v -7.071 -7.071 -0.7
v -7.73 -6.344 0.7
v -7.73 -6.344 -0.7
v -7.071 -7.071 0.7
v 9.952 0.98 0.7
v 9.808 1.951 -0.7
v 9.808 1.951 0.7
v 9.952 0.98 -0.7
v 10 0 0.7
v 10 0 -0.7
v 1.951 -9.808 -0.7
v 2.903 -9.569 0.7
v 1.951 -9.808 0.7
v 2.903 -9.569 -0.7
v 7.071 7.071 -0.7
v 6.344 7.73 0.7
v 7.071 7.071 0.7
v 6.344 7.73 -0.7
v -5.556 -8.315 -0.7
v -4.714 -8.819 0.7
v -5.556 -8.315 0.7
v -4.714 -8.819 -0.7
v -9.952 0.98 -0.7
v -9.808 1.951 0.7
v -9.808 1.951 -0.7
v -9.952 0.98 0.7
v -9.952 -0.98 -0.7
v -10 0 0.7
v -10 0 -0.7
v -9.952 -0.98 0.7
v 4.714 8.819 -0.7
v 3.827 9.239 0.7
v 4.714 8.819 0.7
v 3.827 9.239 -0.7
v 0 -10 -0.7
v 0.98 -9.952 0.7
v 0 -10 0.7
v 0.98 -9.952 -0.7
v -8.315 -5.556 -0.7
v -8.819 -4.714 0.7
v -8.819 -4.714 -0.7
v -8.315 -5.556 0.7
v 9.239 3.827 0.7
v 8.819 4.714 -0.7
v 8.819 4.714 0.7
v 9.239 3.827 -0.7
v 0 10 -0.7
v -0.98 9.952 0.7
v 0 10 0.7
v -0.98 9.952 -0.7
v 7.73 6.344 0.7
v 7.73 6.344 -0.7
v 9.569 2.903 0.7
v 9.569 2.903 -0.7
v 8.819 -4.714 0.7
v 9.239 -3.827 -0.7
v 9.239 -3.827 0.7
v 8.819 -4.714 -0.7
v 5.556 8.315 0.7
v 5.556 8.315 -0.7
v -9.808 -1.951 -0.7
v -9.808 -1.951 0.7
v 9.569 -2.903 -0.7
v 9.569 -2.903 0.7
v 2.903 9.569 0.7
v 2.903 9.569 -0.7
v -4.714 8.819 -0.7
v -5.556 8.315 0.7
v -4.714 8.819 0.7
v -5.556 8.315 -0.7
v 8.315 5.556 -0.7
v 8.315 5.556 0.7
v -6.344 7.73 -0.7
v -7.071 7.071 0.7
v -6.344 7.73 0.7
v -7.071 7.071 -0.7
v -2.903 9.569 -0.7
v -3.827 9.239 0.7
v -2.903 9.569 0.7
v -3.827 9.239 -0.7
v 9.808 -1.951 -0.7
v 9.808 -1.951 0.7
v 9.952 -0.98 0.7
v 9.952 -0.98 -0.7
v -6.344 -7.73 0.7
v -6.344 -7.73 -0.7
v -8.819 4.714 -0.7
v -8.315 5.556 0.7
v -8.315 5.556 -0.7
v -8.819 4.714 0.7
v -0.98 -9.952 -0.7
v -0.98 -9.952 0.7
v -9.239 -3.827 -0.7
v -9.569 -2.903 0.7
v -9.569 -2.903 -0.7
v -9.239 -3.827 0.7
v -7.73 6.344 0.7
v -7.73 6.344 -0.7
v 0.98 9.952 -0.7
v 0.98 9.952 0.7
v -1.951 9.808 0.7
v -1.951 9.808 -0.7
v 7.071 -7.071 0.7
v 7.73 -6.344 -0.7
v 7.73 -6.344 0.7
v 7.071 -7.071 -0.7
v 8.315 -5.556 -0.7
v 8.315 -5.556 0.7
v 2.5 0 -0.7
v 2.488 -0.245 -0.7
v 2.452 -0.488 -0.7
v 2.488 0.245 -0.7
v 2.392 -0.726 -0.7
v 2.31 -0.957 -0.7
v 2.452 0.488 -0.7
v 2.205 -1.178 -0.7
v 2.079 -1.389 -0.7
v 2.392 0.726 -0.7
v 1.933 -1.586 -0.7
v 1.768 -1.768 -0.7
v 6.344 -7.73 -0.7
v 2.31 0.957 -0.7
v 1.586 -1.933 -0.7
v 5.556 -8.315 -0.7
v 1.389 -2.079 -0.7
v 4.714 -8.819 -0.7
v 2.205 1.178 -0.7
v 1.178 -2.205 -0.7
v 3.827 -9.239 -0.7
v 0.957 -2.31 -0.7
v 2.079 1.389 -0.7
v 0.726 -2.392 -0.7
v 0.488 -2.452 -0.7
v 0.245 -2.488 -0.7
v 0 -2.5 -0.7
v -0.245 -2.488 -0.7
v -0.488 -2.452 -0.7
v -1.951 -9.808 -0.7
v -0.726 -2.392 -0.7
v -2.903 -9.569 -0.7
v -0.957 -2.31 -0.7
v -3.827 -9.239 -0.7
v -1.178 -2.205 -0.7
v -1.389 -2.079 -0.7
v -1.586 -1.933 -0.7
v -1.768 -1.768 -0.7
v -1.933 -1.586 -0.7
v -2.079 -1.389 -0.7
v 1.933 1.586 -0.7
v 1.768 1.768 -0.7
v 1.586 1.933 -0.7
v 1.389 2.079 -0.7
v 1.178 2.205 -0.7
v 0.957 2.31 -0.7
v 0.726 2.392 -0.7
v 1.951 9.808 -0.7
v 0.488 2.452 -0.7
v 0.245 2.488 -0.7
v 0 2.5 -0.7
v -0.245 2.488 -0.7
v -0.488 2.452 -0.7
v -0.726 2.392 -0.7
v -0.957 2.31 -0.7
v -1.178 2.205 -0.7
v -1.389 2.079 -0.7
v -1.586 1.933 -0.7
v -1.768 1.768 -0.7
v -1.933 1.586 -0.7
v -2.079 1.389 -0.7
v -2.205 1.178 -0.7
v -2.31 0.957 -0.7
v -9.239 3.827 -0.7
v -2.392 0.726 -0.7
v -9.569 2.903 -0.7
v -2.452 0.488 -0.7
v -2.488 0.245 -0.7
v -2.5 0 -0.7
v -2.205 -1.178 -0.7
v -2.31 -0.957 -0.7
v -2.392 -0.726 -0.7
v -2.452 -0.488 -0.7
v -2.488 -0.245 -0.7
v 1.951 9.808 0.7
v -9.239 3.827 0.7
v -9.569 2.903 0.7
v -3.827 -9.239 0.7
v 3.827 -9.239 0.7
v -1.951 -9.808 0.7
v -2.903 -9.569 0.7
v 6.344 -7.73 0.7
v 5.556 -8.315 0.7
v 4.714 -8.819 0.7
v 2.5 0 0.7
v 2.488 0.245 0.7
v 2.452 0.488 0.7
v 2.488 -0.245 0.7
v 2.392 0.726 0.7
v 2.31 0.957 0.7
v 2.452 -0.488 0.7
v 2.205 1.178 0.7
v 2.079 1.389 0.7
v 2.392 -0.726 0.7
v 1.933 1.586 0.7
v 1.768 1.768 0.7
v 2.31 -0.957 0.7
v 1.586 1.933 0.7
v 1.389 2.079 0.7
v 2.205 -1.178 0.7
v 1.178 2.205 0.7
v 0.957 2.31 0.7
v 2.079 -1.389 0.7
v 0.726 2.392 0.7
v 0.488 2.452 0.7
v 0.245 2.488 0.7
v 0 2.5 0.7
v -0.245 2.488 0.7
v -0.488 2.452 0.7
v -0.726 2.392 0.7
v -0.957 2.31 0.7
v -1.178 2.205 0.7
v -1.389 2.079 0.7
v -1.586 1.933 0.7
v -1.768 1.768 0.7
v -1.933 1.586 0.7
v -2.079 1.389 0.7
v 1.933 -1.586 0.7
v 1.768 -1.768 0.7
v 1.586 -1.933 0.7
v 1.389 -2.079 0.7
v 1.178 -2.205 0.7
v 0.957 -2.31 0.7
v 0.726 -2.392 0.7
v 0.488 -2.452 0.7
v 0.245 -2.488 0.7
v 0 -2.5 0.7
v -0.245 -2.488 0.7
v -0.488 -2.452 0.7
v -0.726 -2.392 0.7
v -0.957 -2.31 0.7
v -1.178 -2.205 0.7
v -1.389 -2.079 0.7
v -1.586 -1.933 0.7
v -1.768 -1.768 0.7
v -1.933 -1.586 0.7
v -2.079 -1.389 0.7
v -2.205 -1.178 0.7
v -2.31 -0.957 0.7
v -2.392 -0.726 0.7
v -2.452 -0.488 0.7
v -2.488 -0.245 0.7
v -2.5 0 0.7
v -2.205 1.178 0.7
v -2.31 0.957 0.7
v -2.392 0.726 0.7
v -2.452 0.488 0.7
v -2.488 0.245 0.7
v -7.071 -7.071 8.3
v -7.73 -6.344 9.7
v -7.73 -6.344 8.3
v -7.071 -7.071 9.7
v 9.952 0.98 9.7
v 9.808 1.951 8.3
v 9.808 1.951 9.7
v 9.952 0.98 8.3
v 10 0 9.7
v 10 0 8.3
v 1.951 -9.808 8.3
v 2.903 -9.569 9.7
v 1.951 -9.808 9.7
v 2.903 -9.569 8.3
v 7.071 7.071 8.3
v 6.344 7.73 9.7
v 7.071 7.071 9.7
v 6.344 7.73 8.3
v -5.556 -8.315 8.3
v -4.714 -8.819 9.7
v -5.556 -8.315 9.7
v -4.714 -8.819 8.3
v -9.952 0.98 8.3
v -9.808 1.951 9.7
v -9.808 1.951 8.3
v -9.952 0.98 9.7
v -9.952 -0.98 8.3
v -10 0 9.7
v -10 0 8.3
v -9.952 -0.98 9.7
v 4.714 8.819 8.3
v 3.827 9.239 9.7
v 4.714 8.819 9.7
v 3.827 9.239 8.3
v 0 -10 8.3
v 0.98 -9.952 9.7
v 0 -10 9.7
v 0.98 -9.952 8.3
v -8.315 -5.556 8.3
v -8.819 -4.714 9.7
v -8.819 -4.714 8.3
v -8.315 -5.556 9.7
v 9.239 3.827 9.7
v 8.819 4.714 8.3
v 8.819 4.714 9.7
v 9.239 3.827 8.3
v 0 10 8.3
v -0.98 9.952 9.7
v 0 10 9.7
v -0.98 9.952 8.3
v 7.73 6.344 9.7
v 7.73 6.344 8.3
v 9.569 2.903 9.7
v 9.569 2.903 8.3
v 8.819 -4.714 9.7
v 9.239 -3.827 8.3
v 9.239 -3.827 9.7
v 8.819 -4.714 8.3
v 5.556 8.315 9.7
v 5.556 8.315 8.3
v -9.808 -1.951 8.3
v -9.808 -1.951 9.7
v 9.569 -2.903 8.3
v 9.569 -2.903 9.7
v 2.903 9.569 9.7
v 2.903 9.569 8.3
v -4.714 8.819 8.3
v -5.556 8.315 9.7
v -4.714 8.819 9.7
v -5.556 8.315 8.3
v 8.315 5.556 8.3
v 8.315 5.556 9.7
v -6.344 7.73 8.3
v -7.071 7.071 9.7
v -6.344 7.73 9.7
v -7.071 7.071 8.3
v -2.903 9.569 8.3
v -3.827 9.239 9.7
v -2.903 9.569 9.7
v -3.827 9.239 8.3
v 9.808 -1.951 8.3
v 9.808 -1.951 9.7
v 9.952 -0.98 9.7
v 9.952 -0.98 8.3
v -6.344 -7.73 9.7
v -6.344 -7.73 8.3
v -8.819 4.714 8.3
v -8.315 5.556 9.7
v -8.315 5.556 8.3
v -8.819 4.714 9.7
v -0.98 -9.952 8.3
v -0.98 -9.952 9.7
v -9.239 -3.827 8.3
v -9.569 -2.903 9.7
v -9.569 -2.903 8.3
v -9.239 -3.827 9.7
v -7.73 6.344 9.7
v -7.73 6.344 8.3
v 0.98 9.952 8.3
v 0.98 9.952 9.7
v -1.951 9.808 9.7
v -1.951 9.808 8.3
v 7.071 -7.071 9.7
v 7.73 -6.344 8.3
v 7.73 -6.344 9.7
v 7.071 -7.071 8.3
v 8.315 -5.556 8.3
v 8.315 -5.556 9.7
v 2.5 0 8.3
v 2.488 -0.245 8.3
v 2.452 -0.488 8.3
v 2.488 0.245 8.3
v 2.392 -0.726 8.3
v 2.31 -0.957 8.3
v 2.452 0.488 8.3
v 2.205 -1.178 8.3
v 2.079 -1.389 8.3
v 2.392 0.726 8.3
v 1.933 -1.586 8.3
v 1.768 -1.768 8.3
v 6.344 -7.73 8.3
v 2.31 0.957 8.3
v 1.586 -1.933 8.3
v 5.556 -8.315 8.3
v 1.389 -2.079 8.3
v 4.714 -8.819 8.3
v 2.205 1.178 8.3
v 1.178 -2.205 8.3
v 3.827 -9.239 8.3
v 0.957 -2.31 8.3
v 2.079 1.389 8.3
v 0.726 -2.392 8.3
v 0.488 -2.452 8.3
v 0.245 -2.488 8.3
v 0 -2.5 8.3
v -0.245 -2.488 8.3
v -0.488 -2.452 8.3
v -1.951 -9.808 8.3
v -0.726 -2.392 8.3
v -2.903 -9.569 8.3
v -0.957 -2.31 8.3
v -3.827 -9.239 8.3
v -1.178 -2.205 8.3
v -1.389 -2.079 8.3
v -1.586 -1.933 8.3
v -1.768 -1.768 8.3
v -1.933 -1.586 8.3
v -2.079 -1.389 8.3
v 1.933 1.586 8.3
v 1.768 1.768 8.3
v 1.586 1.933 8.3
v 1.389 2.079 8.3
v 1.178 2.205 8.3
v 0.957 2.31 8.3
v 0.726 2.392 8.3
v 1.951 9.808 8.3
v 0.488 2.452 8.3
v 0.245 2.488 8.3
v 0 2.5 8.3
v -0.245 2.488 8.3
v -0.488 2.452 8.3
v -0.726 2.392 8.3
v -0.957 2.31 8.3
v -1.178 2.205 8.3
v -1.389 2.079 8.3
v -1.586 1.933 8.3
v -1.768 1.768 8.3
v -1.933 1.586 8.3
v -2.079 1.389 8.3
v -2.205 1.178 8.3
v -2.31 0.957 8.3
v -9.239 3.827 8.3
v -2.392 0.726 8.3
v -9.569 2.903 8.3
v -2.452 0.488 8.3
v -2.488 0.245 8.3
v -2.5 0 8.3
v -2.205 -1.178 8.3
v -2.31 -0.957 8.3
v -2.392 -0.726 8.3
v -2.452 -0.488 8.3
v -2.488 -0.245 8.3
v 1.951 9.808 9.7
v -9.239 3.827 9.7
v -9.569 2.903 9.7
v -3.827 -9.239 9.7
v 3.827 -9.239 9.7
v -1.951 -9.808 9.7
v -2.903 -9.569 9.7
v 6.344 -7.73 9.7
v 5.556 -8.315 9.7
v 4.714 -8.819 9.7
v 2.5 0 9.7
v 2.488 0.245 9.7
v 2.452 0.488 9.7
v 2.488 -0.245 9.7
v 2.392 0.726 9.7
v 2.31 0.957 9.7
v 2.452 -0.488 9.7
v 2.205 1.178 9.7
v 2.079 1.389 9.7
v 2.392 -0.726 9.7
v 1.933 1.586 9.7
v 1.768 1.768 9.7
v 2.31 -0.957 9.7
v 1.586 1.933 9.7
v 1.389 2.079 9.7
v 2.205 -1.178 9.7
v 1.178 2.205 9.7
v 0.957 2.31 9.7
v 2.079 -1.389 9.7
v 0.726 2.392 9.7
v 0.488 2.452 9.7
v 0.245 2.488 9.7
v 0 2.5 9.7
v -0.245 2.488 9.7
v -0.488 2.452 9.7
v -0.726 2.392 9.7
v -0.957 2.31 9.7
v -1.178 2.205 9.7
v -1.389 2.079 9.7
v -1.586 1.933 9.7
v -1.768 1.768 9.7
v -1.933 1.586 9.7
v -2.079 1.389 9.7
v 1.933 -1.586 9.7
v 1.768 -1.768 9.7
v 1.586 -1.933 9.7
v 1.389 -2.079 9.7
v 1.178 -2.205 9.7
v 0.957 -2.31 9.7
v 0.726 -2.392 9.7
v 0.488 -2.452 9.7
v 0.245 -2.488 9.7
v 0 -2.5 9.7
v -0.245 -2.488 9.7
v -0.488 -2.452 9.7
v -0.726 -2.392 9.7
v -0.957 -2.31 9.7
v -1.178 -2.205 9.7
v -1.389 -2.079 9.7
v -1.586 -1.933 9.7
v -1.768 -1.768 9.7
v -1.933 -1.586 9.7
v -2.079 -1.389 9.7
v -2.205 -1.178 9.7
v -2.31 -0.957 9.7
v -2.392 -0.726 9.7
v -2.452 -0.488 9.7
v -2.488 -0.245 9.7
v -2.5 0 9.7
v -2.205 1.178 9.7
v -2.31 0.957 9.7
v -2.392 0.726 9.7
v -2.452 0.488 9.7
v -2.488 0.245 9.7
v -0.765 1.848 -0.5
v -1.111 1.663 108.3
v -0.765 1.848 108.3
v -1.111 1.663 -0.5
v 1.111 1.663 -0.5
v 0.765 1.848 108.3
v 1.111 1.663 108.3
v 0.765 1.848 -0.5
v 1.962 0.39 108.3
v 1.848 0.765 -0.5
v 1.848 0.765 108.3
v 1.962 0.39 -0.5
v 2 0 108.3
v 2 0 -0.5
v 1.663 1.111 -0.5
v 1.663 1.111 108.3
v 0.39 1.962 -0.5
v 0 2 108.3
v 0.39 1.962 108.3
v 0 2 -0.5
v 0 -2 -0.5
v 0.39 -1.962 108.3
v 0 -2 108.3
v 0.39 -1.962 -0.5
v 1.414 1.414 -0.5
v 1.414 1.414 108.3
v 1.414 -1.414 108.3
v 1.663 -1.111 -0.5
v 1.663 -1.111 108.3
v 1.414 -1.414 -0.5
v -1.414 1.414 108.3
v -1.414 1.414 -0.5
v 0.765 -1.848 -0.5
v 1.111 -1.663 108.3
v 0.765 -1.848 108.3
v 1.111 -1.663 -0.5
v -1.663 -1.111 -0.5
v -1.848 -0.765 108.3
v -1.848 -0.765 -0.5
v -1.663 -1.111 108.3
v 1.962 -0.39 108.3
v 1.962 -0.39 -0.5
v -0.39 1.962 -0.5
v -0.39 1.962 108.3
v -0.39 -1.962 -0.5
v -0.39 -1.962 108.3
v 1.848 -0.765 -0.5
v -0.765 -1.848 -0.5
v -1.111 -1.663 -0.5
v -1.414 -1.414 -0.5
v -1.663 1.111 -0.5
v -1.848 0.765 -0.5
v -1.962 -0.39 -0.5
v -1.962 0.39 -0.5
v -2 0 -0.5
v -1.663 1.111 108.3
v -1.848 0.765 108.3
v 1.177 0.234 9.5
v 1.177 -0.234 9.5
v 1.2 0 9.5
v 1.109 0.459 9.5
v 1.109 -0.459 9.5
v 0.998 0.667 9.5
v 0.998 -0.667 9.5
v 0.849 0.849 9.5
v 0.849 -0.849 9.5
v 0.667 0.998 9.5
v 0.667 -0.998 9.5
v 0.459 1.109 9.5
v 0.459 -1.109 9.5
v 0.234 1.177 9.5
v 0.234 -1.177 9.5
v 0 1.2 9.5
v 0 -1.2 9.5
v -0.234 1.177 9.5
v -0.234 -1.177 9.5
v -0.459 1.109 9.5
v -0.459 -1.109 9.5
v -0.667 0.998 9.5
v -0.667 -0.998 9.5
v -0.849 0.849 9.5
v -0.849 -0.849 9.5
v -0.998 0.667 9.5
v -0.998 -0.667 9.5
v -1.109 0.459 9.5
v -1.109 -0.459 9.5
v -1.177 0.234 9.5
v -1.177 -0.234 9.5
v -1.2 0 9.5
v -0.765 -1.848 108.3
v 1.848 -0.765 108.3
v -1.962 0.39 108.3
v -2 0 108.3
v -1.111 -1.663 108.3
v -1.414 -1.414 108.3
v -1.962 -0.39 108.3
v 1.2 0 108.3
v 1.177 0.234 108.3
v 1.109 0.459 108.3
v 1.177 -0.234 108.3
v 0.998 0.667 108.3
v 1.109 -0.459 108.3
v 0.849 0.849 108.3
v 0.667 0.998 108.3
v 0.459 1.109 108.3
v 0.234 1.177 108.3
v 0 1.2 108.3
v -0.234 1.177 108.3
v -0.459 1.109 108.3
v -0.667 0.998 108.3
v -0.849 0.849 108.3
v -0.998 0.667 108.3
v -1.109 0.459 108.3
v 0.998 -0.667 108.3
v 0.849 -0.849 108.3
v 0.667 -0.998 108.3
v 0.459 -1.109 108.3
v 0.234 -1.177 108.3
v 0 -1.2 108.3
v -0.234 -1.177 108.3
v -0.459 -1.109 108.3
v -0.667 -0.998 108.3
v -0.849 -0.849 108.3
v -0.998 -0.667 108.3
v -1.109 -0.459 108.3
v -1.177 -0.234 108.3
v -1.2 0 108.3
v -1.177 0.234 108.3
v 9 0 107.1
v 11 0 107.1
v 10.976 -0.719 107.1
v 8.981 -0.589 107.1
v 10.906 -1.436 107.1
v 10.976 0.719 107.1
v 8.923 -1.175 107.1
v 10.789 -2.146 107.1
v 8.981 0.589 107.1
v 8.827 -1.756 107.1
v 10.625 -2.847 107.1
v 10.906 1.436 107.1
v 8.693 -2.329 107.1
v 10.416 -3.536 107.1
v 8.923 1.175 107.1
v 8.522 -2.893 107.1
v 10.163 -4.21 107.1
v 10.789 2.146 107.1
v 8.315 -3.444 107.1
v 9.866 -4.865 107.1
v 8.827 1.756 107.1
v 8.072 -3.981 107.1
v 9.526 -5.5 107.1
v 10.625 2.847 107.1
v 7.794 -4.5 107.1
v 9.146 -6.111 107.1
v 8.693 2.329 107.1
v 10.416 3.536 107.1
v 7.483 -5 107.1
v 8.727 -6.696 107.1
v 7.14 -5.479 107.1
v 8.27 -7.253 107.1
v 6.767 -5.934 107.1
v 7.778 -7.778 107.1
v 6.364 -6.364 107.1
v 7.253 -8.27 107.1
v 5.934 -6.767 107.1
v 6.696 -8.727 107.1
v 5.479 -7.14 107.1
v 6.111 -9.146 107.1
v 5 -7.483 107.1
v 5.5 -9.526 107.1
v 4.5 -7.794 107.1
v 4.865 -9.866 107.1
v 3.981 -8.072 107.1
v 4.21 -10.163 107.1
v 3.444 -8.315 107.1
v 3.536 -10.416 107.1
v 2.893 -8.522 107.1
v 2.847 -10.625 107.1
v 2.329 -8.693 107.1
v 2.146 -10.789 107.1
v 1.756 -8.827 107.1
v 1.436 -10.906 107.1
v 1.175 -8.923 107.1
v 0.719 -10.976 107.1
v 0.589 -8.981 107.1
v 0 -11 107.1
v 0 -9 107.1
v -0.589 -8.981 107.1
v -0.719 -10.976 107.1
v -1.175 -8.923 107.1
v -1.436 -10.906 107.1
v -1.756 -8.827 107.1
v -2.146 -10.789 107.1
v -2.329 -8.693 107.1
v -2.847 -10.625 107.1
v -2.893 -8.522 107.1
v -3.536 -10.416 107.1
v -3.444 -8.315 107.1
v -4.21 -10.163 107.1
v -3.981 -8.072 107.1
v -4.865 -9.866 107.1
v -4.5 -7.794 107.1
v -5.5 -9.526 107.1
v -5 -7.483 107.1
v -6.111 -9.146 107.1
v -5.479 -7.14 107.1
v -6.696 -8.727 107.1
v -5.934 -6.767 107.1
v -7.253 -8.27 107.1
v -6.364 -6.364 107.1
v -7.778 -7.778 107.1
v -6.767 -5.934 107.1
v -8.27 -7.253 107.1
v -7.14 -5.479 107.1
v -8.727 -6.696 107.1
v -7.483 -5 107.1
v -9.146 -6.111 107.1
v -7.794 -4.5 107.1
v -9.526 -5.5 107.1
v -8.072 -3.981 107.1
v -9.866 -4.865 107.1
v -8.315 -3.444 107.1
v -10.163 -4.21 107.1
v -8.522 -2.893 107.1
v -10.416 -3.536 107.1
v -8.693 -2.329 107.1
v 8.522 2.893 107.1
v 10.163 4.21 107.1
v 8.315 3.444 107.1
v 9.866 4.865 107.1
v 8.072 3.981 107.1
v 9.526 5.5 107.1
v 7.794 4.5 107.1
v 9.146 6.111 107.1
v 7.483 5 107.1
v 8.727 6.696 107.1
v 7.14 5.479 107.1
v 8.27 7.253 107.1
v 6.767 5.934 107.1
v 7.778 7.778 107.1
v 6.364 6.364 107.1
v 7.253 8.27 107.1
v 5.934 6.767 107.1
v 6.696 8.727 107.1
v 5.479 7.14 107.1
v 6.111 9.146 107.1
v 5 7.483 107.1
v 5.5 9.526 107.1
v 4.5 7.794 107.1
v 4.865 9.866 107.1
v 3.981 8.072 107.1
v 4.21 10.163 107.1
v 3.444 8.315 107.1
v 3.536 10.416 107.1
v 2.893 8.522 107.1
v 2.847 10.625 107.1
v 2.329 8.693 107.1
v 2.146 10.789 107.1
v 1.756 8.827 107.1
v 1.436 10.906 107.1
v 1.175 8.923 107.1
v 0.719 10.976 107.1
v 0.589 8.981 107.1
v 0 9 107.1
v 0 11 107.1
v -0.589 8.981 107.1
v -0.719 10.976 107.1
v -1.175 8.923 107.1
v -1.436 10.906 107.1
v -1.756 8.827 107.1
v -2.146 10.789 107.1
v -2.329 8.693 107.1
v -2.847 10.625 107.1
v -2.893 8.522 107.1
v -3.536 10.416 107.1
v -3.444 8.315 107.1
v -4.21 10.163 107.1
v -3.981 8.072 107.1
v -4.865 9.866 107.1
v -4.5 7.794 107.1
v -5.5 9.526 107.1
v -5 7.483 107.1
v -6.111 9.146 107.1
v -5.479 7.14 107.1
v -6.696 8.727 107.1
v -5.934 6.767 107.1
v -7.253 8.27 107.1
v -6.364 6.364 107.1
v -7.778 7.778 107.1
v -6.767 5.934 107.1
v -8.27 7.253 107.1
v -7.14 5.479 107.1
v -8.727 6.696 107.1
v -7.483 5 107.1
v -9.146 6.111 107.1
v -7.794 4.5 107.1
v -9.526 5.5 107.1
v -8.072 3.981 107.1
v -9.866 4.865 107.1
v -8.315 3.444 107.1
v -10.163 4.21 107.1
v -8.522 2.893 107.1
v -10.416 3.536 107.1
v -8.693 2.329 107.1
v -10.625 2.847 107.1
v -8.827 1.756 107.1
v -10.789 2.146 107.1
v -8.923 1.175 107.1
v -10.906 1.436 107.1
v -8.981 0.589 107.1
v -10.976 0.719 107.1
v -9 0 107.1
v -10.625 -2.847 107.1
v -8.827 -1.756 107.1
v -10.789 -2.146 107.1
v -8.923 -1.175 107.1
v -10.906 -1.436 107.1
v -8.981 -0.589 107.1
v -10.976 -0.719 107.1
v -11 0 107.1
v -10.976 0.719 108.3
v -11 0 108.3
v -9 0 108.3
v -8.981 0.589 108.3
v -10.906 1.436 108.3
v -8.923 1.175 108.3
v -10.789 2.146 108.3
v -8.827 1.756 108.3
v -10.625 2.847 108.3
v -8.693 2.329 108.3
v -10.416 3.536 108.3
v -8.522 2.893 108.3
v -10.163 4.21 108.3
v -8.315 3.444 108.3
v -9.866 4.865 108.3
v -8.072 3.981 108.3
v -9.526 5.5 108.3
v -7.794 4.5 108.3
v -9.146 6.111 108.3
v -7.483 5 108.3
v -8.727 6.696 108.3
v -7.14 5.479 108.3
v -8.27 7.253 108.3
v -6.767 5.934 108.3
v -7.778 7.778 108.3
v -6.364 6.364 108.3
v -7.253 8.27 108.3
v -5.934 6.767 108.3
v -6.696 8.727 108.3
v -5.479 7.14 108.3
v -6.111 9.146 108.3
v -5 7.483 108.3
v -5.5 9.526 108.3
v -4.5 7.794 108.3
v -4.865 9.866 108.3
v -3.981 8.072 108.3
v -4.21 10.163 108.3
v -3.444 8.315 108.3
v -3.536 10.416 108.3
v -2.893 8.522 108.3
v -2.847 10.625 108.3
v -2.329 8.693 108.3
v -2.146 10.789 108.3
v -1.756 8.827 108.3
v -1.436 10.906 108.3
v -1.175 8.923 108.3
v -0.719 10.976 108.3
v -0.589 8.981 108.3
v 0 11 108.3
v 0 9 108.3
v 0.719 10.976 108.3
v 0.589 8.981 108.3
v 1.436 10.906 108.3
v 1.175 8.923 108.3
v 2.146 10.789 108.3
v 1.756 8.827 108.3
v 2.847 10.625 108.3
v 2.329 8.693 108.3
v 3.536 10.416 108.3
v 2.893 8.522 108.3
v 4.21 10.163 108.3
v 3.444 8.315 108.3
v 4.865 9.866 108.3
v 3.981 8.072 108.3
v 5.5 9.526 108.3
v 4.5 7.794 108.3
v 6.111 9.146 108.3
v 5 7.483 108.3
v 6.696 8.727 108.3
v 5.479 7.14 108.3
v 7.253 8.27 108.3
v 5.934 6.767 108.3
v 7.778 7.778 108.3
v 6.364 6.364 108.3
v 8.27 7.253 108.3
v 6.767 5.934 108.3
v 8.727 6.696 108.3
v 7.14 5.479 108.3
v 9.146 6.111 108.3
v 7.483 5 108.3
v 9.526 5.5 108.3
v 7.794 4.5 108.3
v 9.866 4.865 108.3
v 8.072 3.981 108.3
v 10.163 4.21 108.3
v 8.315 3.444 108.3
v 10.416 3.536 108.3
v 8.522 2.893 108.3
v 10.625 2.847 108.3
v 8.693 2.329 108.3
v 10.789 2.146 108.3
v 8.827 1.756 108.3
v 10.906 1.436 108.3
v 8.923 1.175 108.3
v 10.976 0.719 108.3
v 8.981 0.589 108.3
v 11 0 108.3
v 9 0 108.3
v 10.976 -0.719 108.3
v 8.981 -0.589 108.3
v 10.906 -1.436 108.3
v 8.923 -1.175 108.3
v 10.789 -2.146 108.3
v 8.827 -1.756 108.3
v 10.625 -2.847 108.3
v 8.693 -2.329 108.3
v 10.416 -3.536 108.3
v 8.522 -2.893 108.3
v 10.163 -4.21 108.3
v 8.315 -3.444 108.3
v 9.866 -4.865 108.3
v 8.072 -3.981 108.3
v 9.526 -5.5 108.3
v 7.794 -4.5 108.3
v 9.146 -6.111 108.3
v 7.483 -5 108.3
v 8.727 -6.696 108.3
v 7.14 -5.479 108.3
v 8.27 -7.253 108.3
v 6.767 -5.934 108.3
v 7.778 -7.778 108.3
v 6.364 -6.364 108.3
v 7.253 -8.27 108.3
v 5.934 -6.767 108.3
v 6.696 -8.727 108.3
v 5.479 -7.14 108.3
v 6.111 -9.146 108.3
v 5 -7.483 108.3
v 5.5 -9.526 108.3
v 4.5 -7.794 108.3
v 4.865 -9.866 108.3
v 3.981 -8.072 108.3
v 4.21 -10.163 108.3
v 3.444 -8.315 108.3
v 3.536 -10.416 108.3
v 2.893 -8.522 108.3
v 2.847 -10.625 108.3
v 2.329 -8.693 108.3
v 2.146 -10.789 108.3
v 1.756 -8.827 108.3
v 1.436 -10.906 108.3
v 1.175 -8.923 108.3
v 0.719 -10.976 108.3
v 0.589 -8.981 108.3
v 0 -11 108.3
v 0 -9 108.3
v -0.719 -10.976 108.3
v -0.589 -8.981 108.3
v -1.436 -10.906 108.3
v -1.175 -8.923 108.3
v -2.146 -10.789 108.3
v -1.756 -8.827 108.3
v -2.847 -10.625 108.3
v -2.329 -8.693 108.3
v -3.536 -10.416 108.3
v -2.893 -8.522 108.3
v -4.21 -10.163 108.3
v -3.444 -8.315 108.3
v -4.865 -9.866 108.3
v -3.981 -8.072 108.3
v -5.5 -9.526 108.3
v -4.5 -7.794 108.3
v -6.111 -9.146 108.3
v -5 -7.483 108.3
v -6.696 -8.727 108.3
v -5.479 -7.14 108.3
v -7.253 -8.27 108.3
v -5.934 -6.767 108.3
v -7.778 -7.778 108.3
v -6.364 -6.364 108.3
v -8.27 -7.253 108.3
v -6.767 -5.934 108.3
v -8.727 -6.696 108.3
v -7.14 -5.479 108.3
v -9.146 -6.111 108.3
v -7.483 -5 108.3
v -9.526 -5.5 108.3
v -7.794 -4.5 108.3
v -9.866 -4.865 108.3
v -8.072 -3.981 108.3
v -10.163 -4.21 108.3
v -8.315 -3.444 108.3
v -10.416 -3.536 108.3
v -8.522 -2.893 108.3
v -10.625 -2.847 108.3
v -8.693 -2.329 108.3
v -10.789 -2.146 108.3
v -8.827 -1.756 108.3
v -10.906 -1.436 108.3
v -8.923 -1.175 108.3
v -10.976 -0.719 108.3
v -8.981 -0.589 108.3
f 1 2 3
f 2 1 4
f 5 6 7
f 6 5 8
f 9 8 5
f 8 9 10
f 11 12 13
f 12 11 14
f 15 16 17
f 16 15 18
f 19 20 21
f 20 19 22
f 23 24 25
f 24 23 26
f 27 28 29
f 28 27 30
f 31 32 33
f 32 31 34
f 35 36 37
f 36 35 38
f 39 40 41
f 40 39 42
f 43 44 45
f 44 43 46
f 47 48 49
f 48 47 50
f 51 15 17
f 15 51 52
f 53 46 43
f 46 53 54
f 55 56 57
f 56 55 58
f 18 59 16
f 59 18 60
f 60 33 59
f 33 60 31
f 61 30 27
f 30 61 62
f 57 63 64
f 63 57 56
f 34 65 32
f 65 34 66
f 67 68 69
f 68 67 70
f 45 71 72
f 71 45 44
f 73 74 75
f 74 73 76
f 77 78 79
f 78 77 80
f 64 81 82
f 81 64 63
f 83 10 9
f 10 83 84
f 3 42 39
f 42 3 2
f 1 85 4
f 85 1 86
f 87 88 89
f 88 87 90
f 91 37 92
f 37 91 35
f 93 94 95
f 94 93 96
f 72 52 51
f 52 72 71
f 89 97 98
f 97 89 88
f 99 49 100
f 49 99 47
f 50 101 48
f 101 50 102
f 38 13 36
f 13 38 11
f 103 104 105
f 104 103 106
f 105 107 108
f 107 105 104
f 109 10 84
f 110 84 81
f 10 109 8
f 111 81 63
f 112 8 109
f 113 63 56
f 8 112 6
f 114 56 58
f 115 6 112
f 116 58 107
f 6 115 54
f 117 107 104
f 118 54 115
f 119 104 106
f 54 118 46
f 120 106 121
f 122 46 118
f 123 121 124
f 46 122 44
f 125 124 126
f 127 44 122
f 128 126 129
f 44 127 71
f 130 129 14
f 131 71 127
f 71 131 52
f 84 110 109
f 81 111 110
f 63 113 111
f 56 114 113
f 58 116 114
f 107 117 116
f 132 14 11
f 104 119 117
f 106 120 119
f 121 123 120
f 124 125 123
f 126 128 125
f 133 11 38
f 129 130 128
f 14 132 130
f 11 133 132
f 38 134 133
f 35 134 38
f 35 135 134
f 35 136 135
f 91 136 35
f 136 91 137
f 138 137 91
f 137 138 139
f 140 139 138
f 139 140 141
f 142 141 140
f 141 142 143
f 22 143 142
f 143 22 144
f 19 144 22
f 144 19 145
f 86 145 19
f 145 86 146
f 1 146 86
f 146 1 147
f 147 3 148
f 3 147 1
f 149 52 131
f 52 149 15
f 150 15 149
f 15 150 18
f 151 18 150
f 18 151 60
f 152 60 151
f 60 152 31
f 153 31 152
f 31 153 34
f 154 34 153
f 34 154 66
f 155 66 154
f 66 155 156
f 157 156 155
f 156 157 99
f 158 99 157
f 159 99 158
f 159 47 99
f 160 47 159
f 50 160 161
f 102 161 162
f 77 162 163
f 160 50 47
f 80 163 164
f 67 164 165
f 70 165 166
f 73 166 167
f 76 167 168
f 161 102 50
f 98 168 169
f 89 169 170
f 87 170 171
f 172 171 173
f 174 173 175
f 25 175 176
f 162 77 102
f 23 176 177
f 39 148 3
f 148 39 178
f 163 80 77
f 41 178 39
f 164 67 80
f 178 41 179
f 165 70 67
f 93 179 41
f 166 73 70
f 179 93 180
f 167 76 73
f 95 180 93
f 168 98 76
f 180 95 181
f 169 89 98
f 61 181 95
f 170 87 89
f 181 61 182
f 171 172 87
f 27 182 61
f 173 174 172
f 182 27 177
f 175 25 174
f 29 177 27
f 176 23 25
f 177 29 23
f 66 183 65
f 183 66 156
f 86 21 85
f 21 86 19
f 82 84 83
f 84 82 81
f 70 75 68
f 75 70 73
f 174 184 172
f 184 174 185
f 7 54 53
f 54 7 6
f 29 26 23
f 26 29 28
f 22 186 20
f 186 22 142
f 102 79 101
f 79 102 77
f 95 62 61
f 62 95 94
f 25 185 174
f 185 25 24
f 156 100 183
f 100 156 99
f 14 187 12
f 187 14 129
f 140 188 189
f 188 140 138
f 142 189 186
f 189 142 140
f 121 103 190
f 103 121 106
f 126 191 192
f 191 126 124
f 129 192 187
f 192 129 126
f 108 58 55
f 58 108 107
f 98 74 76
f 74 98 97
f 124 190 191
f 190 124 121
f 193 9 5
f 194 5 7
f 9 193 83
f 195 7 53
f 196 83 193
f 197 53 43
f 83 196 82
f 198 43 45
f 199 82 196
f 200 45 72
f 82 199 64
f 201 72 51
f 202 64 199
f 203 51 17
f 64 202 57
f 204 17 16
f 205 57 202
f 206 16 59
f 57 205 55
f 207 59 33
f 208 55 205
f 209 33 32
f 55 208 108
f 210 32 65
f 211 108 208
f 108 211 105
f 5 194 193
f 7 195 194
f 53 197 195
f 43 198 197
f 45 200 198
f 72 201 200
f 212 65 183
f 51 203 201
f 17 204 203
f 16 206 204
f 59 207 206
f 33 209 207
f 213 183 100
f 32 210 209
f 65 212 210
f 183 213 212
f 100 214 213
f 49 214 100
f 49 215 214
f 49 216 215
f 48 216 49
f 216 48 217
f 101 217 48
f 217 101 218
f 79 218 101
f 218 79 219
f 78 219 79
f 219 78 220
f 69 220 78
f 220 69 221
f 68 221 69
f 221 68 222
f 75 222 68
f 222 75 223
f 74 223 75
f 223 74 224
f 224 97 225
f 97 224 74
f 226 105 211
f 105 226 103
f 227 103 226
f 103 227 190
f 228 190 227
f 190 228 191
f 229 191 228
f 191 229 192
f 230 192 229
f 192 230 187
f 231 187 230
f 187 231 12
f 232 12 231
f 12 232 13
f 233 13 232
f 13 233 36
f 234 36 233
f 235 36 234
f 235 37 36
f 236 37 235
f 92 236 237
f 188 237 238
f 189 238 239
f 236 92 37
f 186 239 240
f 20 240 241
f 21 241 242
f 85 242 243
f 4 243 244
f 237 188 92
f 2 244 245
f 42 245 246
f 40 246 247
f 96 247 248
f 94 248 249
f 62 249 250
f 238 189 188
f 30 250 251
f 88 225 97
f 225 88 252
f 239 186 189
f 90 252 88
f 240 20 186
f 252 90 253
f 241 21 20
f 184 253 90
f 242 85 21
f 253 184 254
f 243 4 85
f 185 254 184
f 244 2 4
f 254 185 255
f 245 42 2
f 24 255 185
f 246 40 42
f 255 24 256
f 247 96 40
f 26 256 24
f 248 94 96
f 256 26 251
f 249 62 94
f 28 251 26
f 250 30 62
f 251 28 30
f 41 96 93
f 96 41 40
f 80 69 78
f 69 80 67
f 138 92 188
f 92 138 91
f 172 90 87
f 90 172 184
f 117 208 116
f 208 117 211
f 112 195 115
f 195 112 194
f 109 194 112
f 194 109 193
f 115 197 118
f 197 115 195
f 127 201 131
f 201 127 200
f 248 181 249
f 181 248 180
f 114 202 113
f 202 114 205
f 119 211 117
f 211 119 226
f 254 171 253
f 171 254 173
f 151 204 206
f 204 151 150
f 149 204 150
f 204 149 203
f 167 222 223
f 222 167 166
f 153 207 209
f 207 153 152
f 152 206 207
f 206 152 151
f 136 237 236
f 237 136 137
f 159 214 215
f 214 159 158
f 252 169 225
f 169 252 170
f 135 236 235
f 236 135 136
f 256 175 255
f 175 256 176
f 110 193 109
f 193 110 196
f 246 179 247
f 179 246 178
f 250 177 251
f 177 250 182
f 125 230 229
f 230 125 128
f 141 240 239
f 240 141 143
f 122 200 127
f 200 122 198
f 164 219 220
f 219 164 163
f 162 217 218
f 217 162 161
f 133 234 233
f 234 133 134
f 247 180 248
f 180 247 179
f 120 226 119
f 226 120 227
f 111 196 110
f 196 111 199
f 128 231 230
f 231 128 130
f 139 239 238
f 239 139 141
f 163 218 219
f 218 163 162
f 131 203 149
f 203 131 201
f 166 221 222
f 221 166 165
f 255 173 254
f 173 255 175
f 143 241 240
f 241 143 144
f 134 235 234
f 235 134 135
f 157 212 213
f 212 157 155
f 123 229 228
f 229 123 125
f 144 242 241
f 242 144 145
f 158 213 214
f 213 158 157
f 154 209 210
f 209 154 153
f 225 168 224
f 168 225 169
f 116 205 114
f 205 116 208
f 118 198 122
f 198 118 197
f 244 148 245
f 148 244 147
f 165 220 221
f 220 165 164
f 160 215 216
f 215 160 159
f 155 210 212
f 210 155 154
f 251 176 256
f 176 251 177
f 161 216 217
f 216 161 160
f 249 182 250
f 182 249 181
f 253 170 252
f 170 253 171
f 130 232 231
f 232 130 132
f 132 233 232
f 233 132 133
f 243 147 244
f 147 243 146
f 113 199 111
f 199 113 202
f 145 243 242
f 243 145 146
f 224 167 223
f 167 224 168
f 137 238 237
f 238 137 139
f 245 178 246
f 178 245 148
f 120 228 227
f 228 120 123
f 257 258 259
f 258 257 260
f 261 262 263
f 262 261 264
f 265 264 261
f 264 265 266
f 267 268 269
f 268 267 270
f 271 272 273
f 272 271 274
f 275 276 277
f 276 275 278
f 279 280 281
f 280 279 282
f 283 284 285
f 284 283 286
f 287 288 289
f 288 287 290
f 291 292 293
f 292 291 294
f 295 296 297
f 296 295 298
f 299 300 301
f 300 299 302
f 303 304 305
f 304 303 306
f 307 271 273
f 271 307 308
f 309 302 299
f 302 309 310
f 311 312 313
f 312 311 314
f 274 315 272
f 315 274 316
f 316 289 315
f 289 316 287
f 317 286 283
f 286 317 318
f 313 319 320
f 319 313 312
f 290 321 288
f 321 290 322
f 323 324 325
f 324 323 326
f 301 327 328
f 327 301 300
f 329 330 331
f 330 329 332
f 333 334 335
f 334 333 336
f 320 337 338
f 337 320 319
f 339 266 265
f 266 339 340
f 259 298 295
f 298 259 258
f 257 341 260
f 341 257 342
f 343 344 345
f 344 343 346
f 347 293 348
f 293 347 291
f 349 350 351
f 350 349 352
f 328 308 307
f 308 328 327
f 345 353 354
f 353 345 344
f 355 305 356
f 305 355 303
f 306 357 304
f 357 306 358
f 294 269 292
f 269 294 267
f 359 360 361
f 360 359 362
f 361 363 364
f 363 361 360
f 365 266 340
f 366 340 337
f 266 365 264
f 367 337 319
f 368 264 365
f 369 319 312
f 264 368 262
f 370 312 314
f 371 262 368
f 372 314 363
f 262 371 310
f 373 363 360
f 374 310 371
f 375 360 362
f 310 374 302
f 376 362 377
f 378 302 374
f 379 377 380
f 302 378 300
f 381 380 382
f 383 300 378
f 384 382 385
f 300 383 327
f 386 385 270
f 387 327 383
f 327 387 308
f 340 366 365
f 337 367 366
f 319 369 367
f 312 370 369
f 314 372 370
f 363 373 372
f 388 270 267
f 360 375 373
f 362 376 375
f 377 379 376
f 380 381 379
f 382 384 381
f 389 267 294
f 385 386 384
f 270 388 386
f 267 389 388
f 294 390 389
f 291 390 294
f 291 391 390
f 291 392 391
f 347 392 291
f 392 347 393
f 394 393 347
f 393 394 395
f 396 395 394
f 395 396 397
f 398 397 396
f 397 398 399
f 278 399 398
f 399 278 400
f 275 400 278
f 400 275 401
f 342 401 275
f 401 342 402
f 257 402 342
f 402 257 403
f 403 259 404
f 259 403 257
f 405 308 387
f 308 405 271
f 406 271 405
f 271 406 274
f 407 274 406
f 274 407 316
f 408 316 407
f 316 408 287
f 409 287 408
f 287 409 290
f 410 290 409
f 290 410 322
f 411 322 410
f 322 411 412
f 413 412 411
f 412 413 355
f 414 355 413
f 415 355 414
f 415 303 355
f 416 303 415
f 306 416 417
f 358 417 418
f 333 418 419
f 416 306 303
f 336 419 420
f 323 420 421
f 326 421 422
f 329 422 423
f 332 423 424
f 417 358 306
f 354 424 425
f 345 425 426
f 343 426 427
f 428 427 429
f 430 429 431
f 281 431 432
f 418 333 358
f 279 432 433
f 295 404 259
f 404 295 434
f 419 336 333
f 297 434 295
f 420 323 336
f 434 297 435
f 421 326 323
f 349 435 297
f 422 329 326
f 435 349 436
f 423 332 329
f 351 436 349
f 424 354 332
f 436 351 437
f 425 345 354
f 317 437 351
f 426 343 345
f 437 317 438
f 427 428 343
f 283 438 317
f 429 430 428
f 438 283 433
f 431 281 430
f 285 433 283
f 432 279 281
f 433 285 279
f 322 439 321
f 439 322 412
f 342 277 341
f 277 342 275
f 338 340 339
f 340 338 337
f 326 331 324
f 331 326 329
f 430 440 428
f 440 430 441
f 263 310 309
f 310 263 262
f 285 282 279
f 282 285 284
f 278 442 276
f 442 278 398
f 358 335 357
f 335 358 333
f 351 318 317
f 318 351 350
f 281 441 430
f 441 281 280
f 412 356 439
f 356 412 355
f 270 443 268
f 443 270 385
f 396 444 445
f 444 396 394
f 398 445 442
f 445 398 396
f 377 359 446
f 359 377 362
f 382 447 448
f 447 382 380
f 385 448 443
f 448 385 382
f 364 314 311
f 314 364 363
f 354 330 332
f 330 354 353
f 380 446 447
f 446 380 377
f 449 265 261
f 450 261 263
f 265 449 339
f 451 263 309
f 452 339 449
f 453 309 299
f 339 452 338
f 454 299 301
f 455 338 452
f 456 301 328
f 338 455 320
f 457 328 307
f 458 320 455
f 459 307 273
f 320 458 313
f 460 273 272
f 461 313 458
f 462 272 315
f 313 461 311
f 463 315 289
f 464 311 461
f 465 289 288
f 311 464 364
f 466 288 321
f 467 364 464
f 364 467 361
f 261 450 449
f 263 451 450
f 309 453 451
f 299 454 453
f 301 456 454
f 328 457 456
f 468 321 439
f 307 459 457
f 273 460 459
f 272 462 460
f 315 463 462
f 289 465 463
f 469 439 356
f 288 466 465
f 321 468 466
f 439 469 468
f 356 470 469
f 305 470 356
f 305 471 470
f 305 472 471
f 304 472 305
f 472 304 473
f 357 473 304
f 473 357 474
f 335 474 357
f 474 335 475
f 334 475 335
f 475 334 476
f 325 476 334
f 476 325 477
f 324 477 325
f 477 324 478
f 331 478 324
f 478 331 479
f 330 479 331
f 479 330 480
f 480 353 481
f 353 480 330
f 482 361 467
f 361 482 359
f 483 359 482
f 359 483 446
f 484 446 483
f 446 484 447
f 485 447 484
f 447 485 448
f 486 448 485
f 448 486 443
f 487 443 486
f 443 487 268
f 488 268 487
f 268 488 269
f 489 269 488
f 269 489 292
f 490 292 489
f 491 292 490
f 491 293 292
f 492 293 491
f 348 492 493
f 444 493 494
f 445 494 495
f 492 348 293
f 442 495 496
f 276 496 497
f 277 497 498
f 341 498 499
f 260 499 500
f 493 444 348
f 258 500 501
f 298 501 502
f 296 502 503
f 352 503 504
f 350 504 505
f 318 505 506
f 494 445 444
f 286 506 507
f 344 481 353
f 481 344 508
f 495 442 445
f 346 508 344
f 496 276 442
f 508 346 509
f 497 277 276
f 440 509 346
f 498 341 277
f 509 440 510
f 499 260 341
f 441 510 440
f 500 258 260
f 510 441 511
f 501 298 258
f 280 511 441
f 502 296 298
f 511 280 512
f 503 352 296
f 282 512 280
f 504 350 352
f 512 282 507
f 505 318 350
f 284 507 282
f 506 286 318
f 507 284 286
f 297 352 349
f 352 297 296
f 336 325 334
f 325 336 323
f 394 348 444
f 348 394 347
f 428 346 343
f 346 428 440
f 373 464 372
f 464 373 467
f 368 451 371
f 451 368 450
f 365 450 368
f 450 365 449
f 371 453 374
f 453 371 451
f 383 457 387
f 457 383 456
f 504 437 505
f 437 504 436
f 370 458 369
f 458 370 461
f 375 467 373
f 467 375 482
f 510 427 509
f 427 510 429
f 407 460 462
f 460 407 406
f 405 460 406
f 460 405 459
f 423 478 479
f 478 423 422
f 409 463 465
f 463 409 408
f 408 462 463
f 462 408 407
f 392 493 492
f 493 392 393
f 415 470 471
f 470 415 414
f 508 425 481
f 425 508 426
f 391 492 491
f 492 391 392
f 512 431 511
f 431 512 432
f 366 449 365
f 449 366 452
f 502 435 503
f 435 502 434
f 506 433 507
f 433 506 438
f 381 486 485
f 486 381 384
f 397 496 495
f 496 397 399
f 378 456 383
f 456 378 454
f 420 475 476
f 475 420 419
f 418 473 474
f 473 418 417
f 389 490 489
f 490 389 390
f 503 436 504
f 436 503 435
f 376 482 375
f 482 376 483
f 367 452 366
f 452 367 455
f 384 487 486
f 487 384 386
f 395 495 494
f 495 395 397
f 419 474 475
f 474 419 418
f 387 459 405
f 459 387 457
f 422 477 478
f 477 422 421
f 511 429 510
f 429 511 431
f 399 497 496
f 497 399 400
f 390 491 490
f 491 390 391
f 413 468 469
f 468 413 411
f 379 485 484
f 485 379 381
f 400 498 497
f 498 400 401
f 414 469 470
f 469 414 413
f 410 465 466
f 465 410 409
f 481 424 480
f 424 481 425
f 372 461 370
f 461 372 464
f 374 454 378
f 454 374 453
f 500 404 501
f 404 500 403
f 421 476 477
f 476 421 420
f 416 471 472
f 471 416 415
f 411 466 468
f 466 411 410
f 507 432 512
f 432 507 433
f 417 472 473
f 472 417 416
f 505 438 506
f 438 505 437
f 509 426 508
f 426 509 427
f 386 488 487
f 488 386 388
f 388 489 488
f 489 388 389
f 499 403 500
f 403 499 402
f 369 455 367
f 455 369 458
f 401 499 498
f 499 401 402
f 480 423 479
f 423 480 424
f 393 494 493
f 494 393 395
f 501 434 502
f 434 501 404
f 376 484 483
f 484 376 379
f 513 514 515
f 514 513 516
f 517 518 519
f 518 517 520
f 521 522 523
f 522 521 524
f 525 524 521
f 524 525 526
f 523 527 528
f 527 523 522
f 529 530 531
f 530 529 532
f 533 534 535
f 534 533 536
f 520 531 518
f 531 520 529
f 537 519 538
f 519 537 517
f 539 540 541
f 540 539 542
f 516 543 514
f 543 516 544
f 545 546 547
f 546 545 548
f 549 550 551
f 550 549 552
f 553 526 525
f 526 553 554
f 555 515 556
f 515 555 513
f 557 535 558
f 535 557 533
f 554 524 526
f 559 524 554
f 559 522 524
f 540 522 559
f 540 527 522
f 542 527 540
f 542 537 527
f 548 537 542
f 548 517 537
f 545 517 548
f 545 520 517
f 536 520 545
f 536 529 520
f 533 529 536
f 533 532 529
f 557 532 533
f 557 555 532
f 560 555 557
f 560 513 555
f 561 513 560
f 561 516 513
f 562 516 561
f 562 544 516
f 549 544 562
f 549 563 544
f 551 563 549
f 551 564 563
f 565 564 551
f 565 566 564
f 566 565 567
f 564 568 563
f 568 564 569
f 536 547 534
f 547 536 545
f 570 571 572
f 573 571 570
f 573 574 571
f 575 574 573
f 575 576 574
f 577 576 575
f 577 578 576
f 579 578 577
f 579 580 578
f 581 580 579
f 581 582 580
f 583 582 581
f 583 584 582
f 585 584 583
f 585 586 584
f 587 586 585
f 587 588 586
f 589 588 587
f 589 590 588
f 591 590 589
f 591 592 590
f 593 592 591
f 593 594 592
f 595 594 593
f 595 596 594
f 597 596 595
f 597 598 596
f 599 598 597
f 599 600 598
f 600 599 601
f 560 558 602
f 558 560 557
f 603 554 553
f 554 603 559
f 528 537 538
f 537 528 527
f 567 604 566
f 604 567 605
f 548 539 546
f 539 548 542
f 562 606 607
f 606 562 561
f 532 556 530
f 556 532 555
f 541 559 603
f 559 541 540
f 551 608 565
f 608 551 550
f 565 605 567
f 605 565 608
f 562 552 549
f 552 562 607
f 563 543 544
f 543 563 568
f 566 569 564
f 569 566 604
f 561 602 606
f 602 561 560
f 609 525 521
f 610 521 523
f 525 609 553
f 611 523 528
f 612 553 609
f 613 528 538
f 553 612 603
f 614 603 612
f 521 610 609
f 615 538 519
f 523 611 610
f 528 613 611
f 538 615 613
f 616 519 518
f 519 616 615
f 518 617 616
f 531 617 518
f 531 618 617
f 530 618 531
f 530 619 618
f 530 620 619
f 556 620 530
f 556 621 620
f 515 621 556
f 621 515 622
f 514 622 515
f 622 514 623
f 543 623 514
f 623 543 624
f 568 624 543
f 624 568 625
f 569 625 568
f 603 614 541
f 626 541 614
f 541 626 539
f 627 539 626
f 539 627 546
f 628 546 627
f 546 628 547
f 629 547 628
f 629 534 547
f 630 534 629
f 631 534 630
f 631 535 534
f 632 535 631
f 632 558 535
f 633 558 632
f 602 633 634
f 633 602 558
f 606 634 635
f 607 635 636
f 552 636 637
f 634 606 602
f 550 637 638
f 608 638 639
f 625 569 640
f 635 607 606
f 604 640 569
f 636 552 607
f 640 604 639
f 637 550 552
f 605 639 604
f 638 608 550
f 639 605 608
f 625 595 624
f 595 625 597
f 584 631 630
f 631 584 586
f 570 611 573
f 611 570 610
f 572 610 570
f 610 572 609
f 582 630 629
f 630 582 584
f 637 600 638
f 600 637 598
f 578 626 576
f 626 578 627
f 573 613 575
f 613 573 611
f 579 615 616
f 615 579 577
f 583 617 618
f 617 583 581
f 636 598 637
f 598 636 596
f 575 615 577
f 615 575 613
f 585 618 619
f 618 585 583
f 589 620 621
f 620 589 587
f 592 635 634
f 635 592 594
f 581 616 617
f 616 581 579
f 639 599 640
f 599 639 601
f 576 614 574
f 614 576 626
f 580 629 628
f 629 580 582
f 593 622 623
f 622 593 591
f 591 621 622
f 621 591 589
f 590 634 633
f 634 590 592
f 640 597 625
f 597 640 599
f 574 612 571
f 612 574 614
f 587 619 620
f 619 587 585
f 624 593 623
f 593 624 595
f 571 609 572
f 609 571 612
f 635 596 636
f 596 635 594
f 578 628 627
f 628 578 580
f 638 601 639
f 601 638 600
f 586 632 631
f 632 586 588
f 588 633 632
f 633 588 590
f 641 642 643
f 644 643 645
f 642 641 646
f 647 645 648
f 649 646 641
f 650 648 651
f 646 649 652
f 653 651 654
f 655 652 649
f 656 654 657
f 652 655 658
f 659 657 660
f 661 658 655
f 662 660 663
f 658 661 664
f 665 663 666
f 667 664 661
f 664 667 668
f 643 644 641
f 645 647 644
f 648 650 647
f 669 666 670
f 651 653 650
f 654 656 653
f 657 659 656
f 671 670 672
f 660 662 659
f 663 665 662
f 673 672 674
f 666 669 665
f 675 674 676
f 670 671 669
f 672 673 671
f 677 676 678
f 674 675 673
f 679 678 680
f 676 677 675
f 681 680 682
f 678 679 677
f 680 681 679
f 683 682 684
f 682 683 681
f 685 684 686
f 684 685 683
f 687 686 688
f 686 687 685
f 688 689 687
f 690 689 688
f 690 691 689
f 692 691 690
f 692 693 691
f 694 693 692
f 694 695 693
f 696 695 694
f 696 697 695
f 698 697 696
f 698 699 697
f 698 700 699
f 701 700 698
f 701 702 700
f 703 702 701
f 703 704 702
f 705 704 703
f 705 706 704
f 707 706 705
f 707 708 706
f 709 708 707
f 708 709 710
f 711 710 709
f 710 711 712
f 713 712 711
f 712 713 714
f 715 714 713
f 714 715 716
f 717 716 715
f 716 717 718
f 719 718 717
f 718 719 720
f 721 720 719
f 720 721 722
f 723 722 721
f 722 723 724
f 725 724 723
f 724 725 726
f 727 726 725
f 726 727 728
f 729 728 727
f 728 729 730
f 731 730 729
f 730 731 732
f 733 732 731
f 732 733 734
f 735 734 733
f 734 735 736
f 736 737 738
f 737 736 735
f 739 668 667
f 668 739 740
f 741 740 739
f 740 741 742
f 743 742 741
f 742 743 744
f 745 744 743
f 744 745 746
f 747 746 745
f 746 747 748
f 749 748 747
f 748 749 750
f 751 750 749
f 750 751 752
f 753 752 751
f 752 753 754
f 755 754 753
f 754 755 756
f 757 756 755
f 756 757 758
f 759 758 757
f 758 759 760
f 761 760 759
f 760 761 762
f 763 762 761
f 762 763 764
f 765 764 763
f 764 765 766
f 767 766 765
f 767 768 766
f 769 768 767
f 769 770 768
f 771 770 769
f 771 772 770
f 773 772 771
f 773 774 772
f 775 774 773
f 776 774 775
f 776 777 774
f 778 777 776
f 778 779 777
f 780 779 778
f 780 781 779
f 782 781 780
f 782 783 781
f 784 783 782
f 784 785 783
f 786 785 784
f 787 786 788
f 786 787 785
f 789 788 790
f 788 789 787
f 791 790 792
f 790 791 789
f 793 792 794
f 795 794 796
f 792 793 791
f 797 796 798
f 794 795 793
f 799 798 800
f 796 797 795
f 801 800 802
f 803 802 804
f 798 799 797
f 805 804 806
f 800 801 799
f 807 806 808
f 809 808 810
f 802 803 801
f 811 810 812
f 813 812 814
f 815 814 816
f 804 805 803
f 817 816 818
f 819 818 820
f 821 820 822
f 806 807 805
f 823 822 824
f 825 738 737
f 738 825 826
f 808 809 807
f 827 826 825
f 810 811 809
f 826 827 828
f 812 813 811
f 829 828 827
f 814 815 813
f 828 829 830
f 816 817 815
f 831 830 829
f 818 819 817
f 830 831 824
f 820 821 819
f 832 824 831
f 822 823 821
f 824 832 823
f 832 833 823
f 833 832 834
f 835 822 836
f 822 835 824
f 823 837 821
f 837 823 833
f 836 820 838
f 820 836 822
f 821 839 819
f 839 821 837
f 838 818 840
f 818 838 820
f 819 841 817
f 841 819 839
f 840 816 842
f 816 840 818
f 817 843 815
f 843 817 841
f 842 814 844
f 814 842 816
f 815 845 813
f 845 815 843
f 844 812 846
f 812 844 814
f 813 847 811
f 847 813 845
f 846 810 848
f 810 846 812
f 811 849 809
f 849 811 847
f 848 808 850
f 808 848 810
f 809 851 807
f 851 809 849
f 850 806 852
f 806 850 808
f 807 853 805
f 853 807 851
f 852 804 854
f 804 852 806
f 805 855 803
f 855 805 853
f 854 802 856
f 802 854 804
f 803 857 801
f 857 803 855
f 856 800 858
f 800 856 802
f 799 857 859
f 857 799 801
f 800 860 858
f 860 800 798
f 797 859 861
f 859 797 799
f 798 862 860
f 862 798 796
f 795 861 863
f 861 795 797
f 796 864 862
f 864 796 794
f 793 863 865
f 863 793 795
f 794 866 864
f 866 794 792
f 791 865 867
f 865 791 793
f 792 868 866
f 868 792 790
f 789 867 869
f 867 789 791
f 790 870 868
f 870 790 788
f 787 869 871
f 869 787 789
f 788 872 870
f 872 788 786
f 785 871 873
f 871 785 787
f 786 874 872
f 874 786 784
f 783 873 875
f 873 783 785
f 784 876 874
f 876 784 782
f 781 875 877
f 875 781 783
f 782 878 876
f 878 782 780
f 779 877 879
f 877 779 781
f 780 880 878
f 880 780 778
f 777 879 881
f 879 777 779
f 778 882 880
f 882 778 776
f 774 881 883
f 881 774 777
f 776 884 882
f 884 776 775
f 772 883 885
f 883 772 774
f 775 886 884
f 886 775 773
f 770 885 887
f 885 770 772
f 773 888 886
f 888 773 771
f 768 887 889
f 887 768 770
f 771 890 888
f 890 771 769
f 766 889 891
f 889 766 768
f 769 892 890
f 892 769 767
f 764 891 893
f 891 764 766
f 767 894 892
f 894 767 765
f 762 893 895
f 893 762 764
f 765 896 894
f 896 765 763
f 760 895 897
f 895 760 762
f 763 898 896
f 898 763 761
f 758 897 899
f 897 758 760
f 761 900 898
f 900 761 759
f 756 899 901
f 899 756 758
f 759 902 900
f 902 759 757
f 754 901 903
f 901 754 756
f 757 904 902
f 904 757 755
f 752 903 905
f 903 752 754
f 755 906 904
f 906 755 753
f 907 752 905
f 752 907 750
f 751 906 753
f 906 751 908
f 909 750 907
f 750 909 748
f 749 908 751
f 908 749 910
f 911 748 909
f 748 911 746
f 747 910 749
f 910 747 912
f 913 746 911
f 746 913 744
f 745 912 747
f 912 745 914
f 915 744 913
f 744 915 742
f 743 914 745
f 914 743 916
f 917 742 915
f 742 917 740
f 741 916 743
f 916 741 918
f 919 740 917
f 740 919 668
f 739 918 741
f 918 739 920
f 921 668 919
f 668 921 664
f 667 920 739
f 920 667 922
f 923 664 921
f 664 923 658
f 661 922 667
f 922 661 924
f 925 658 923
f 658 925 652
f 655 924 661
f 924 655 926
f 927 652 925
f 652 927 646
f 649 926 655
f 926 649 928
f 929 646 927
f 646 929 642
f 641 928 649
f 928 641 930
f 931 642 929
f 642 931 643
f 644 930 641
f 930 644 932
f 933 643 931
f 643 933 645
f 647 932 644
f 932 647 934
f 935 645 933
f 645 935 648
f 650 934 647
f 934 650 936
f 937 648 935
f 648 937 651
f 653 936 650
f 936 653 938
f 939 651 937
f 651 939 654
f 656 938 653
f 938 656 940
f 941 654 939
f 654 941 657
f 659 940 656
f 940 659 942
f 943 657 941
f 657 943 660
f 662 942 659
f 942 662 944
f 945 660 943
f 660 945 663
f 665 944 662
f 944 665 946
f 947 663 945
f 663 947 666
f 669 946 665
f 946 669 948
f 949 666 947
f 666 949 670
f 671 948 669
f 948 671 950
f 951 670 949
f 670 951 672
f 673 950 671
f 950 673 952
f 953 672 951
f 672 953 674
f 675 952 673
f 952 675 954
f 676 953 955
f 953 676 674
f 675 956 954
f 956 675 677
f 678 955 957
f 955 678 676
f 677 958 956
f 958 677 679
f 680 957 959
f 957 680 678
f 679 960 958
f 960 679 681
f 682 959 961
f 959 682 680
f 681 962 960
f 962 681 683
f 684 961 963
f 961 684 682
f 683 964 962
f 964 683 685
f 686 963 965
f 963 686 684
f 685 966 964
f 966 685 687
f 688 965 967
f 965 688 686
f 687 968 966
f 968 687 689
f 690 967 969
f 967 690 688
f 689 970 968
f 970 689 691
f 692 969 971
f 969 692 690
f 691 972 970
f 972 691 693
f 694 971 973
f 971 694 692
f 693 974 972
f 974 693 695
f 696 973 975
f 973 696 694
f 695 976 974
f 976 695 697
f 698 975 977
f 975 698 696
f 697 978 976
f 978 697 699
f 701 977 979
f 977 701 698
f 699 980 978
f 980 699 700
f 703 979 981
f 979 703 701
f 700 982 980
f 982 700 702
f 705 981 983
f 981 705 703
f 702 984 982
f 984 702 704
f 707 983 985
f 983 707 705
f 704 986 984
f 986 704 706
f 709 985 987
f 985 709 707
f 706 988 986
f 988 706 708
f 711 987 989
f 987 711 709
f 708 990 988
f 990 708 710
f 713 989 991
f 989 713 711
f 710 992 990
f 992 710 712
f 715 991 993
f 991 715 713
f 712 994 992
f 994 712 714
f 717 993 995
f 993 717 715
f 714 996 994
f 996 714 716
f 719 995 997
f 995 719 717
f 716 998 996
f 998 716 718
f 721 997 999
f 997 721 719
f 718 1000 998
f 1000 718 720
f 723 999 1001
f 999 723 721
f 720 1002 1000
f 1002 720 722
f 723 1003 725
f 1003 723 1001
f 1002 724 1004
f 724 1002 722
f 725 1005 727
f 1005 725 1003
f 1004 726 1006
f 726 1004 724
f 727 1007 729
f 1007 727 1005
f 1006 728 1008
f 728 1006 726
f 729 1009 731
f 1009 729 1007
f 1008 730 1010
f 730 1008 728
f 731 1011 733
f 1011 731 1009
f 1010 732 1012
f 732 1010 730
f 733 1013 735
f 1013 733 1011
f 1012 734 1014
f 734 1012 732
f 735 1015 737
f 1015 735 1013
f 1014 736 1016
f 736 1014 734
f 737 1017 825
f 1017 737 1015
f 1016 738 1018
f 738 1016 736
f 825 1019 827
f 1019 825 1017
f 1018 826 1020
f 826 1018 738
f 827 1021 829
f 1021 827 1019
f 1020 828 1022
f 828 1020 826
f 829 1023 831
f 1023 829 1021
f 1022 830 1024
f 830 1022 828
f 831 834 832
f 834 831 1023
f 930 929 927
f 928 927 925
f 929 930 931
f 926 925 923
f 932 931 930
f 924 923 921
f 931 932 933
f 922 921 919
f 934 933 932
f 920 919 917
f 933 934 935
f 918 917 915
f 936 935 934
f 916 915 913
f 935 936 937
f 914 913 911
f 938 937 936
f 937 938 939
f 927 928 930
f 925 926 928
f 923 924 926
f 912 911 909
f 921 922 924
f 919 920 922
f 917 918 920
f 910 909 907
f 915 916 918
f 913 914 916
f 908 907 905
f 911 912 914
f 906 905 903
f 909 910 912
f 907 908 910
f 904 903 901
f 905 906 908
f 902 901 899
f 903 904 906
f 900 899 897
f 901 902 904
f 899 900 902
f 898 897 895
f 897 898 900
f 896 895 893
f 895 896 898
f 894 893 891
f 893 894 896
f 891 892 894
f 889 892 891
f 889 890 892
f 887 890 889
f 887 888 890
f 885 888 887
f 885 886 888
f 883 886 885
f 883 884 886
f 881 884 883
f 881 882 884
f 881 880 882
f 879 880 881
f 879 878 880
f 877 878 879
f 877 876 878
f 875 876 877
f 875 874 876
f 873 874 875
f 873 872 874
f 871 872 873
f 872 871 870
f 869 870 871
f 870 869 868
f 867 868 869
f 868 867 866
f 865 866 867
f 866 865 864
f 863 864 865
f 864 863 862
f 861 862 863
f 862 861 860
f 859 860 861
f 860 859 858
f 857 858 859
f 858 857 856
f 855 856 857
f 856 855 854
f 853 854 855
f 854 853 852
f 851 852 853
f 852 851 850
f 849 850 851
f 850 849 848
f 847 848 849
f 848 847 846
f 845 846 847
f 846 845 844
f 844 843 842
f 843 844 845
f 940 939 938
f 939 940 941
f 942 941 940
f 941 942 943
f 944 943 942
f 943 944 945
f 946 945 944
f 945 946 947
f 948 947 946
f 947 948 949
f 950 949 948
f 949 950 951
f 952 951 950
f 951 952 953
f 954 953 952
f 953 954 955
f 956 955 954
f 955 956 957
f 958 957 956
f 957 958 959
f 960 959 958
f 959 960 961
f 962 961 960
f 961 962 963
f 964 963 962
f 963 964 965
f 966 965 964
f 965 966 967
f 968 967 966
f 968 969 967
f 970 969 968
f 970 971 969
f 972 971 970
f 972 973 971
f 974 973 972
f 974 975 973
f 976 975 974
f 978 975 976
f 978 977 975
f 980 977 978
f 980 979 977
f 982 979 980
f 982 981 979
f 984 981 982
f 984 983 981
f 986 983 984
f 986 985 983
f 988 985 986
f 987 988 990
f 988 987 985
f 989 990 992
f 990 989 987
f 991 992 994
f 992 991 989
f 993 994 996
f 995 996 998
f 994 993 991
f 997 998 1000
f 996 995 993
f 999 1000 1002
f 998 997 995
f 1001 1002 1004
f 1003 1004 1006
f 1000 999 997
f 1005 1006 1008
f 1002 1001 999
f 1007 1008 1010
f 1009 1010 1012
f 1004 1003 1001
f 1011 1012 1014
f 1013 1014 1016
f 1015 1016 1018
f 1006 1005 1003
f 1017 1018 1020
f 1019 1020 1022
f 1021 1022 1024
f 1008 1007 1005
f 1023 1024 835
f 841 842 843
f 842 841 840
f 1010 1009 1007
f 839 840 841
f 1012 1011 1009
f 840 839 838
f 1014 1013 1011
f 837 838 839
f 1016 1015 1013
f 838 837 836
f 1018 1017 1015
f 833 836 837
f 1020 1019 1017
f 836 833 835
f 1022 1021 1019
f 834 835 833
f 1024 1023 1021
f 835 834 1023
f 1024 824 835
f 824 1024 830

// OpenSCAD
// Parameters
inner_diameter_mm = 5; //[2.5:10:0.1]
outer_diameter_mm = 20; //[10:40:0.5]
thickness_mm      = 1.4; //[0.7:2.8:0.1]
eps_mm            = 0.2; //[0.05:0.5:0.05]

// Connectivity overlap (1–2mm as required)
overlap_mm = 1.2;

// Penny Washer - complete geometry
module penny_washer() {
  difference() {
    cylinder(r=outer_diameter_mm/2, h=thickness_mm, center=true, $fn=64);
    cylinder(r=inner_diameter_mm/2, h=thickness_mm + 2*eps_mm, center=true, $fn=64);
  }
}

// Screw and Washer - complete geometry (washer fused to rod with overlap)
module screw_and_washer() {
  screw_h = 10;
  screw_r = 2;

  union() {
    // Screw body
    cylinder(r=screw_r, h=screw_h, center=false, $fn=32);

    // Washer intersects screw by overlap (no floating)
    translate([0, 0, screw_h - overlap_mm + thickness_mm/2])
      penny_washer();
  }
}

// Post 4mm Hole - FIXED structurally: make it a real tube (was empty before)
module post_4mm_hole() {
  post_h = 100;
  post_outer_r = 2;                 // keep overall outer size
  post_inner_r = max(0.1, 2 - 0.8);  // create material; ~0.8mm wall

  difference() {
    cylinder(r=post_outer_r, h=post_h, center=false, $fn=32);
    // inner hole runs through, slightly extended for clean boolean
    translate([0, 0, -eps_mm])
      cylinder(r=post_inner_r, h=post_h + 2*eps_mm, center=false, $fn=32);
  }
}

// Round Grommet Top - FIXED structurally: give it thickness so it can fuse
module round_grommet_top() {
  // Original was a zero-thickness surface (rotate_extrude of a circle).
  // Make it a thin solid ring by extruding a small rectangle profile.
  grommet_radial_thk = 2;                 // ~2mm radial thickness
  grommet_axial_thk  = max(1.2, overlap_mm); // >= overlap so it fuses reliably

  rotate_extrude($fn=96)
    translate([outer_diameter_mm/2, 0, 0])
      square([grommet_radial_thk, grommet_axial_thk], center=true);
}

// Assembly (single union; all parts overlap and are physically connected)
module assembly() {
  screw_h = 10;
  post_h  = 100;

  // Base washer centered at z=0 spans [-t/2, +t/2]
  z_base_washer_top = thickness_mm/2;

  // Screw is non-centered (0..screw_h). Place so it penetrates base washer by overlap.
  z_screw_base = z_base_washer_top - overlap_mm;
  z_screw_top  = z_screw_base + screw_h;

  // Post is non-centered (0..post_h). Place so it penetrates screw top by overlap.
  z_post_base = z_screw_top - overlap_mm;
  z_post_top  = z_post_base + post_h;

  // Grommet is centered; place so its bottom penetrates post top by overlap.
  // grommet axial thickness is grommet_axial_thk (defined in module), but we ensure
  // intersection by placing its center at (post_top - overlap + grommet_axial_thk/2).
  grommet_axial_thk = max(1.2, overlap_mm);
  z_grommet_center = z_post_top - overlap_mm + grommet_axial_thk/2;

  union() {
    // Base washer
    penny_washer();

    // Screw + its washer (fused internally)
    translate([0, 0, z_screw_base])
      screw_and_washer();

    // Post (now a real solid tube) fused to screw
    translate([0, 0, z_post_base])
      post_4mm_hole();

    // Top grommet (now a real solid) fused to post
    translate([0, 0, z_grommet_center])
      round_grommet_top();
  }
}

assembly();
